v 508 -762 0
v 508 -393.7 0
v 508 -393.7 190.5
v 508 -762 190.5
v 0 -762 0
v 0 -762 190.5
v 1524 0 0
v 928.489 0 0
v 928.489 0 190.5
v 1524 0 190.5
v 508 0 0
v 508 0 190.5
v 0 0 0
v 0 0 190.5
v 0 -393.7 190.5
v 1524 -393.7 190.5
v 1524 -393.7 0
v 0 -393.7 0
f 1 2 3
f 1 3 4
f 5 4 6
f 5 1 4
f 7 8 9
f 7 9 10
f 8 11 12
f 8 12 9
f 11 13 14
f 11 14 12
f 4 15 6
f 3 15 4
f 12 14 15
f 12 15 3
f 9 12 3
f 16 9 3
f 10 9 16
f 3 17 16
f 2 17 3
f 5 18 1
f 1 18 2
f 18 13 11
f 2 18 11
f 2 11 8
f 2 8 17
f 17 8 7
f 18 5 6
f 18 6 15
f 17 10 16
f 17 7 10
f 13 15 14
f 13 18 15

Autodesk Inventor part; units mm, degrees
ref_plane "YZ Plane" through (0, 0, 0) normal (1, 0, 0) x (0, 1, 0)
ref_plane "XZ Plane" through (0, 0, 0) normal (0, 1, 0) x (-1, 0, 0)
ref_plane "XY Plane" through (0, 0, 0) normal (0, 0, 1) x (1, 0, 0)
sketch "Sketch1" plane through (0, 0, 0) normal (0, 0, 1) x (1, 0, 0)
  line L0 (0, 0) -> (1524, 0)
  line L1 (1524, 0) -> (1524, -393.7)
  line L2 (1524, -393.7) -> (508, -393.7)
  line L3 (0, -393.7) -> (0, 0)
  line L4 (0, 0) -> (928.4892, 0)
  line L5 (420.4892, -393.7) -> (508, -393.7)
  line L6 (0, -393.7) -> (0, 0)
  line L7 (0, 0) -> (508, 0)
  line L8 (508, -393.7) -> (508, -762)
  line L9 (508, -762) -> (0, -762)
  line L10 (0, -762) -> (0, 0)
  dimension "d0" = 393.7
  dimension "d1" = 1524
  dimension "d2" = 762
  dimension "d3" = 508
extrude "Extrusion1" add sketch "Sketch1" along normal blind 190.5
properties part number "laser-enclosure"
